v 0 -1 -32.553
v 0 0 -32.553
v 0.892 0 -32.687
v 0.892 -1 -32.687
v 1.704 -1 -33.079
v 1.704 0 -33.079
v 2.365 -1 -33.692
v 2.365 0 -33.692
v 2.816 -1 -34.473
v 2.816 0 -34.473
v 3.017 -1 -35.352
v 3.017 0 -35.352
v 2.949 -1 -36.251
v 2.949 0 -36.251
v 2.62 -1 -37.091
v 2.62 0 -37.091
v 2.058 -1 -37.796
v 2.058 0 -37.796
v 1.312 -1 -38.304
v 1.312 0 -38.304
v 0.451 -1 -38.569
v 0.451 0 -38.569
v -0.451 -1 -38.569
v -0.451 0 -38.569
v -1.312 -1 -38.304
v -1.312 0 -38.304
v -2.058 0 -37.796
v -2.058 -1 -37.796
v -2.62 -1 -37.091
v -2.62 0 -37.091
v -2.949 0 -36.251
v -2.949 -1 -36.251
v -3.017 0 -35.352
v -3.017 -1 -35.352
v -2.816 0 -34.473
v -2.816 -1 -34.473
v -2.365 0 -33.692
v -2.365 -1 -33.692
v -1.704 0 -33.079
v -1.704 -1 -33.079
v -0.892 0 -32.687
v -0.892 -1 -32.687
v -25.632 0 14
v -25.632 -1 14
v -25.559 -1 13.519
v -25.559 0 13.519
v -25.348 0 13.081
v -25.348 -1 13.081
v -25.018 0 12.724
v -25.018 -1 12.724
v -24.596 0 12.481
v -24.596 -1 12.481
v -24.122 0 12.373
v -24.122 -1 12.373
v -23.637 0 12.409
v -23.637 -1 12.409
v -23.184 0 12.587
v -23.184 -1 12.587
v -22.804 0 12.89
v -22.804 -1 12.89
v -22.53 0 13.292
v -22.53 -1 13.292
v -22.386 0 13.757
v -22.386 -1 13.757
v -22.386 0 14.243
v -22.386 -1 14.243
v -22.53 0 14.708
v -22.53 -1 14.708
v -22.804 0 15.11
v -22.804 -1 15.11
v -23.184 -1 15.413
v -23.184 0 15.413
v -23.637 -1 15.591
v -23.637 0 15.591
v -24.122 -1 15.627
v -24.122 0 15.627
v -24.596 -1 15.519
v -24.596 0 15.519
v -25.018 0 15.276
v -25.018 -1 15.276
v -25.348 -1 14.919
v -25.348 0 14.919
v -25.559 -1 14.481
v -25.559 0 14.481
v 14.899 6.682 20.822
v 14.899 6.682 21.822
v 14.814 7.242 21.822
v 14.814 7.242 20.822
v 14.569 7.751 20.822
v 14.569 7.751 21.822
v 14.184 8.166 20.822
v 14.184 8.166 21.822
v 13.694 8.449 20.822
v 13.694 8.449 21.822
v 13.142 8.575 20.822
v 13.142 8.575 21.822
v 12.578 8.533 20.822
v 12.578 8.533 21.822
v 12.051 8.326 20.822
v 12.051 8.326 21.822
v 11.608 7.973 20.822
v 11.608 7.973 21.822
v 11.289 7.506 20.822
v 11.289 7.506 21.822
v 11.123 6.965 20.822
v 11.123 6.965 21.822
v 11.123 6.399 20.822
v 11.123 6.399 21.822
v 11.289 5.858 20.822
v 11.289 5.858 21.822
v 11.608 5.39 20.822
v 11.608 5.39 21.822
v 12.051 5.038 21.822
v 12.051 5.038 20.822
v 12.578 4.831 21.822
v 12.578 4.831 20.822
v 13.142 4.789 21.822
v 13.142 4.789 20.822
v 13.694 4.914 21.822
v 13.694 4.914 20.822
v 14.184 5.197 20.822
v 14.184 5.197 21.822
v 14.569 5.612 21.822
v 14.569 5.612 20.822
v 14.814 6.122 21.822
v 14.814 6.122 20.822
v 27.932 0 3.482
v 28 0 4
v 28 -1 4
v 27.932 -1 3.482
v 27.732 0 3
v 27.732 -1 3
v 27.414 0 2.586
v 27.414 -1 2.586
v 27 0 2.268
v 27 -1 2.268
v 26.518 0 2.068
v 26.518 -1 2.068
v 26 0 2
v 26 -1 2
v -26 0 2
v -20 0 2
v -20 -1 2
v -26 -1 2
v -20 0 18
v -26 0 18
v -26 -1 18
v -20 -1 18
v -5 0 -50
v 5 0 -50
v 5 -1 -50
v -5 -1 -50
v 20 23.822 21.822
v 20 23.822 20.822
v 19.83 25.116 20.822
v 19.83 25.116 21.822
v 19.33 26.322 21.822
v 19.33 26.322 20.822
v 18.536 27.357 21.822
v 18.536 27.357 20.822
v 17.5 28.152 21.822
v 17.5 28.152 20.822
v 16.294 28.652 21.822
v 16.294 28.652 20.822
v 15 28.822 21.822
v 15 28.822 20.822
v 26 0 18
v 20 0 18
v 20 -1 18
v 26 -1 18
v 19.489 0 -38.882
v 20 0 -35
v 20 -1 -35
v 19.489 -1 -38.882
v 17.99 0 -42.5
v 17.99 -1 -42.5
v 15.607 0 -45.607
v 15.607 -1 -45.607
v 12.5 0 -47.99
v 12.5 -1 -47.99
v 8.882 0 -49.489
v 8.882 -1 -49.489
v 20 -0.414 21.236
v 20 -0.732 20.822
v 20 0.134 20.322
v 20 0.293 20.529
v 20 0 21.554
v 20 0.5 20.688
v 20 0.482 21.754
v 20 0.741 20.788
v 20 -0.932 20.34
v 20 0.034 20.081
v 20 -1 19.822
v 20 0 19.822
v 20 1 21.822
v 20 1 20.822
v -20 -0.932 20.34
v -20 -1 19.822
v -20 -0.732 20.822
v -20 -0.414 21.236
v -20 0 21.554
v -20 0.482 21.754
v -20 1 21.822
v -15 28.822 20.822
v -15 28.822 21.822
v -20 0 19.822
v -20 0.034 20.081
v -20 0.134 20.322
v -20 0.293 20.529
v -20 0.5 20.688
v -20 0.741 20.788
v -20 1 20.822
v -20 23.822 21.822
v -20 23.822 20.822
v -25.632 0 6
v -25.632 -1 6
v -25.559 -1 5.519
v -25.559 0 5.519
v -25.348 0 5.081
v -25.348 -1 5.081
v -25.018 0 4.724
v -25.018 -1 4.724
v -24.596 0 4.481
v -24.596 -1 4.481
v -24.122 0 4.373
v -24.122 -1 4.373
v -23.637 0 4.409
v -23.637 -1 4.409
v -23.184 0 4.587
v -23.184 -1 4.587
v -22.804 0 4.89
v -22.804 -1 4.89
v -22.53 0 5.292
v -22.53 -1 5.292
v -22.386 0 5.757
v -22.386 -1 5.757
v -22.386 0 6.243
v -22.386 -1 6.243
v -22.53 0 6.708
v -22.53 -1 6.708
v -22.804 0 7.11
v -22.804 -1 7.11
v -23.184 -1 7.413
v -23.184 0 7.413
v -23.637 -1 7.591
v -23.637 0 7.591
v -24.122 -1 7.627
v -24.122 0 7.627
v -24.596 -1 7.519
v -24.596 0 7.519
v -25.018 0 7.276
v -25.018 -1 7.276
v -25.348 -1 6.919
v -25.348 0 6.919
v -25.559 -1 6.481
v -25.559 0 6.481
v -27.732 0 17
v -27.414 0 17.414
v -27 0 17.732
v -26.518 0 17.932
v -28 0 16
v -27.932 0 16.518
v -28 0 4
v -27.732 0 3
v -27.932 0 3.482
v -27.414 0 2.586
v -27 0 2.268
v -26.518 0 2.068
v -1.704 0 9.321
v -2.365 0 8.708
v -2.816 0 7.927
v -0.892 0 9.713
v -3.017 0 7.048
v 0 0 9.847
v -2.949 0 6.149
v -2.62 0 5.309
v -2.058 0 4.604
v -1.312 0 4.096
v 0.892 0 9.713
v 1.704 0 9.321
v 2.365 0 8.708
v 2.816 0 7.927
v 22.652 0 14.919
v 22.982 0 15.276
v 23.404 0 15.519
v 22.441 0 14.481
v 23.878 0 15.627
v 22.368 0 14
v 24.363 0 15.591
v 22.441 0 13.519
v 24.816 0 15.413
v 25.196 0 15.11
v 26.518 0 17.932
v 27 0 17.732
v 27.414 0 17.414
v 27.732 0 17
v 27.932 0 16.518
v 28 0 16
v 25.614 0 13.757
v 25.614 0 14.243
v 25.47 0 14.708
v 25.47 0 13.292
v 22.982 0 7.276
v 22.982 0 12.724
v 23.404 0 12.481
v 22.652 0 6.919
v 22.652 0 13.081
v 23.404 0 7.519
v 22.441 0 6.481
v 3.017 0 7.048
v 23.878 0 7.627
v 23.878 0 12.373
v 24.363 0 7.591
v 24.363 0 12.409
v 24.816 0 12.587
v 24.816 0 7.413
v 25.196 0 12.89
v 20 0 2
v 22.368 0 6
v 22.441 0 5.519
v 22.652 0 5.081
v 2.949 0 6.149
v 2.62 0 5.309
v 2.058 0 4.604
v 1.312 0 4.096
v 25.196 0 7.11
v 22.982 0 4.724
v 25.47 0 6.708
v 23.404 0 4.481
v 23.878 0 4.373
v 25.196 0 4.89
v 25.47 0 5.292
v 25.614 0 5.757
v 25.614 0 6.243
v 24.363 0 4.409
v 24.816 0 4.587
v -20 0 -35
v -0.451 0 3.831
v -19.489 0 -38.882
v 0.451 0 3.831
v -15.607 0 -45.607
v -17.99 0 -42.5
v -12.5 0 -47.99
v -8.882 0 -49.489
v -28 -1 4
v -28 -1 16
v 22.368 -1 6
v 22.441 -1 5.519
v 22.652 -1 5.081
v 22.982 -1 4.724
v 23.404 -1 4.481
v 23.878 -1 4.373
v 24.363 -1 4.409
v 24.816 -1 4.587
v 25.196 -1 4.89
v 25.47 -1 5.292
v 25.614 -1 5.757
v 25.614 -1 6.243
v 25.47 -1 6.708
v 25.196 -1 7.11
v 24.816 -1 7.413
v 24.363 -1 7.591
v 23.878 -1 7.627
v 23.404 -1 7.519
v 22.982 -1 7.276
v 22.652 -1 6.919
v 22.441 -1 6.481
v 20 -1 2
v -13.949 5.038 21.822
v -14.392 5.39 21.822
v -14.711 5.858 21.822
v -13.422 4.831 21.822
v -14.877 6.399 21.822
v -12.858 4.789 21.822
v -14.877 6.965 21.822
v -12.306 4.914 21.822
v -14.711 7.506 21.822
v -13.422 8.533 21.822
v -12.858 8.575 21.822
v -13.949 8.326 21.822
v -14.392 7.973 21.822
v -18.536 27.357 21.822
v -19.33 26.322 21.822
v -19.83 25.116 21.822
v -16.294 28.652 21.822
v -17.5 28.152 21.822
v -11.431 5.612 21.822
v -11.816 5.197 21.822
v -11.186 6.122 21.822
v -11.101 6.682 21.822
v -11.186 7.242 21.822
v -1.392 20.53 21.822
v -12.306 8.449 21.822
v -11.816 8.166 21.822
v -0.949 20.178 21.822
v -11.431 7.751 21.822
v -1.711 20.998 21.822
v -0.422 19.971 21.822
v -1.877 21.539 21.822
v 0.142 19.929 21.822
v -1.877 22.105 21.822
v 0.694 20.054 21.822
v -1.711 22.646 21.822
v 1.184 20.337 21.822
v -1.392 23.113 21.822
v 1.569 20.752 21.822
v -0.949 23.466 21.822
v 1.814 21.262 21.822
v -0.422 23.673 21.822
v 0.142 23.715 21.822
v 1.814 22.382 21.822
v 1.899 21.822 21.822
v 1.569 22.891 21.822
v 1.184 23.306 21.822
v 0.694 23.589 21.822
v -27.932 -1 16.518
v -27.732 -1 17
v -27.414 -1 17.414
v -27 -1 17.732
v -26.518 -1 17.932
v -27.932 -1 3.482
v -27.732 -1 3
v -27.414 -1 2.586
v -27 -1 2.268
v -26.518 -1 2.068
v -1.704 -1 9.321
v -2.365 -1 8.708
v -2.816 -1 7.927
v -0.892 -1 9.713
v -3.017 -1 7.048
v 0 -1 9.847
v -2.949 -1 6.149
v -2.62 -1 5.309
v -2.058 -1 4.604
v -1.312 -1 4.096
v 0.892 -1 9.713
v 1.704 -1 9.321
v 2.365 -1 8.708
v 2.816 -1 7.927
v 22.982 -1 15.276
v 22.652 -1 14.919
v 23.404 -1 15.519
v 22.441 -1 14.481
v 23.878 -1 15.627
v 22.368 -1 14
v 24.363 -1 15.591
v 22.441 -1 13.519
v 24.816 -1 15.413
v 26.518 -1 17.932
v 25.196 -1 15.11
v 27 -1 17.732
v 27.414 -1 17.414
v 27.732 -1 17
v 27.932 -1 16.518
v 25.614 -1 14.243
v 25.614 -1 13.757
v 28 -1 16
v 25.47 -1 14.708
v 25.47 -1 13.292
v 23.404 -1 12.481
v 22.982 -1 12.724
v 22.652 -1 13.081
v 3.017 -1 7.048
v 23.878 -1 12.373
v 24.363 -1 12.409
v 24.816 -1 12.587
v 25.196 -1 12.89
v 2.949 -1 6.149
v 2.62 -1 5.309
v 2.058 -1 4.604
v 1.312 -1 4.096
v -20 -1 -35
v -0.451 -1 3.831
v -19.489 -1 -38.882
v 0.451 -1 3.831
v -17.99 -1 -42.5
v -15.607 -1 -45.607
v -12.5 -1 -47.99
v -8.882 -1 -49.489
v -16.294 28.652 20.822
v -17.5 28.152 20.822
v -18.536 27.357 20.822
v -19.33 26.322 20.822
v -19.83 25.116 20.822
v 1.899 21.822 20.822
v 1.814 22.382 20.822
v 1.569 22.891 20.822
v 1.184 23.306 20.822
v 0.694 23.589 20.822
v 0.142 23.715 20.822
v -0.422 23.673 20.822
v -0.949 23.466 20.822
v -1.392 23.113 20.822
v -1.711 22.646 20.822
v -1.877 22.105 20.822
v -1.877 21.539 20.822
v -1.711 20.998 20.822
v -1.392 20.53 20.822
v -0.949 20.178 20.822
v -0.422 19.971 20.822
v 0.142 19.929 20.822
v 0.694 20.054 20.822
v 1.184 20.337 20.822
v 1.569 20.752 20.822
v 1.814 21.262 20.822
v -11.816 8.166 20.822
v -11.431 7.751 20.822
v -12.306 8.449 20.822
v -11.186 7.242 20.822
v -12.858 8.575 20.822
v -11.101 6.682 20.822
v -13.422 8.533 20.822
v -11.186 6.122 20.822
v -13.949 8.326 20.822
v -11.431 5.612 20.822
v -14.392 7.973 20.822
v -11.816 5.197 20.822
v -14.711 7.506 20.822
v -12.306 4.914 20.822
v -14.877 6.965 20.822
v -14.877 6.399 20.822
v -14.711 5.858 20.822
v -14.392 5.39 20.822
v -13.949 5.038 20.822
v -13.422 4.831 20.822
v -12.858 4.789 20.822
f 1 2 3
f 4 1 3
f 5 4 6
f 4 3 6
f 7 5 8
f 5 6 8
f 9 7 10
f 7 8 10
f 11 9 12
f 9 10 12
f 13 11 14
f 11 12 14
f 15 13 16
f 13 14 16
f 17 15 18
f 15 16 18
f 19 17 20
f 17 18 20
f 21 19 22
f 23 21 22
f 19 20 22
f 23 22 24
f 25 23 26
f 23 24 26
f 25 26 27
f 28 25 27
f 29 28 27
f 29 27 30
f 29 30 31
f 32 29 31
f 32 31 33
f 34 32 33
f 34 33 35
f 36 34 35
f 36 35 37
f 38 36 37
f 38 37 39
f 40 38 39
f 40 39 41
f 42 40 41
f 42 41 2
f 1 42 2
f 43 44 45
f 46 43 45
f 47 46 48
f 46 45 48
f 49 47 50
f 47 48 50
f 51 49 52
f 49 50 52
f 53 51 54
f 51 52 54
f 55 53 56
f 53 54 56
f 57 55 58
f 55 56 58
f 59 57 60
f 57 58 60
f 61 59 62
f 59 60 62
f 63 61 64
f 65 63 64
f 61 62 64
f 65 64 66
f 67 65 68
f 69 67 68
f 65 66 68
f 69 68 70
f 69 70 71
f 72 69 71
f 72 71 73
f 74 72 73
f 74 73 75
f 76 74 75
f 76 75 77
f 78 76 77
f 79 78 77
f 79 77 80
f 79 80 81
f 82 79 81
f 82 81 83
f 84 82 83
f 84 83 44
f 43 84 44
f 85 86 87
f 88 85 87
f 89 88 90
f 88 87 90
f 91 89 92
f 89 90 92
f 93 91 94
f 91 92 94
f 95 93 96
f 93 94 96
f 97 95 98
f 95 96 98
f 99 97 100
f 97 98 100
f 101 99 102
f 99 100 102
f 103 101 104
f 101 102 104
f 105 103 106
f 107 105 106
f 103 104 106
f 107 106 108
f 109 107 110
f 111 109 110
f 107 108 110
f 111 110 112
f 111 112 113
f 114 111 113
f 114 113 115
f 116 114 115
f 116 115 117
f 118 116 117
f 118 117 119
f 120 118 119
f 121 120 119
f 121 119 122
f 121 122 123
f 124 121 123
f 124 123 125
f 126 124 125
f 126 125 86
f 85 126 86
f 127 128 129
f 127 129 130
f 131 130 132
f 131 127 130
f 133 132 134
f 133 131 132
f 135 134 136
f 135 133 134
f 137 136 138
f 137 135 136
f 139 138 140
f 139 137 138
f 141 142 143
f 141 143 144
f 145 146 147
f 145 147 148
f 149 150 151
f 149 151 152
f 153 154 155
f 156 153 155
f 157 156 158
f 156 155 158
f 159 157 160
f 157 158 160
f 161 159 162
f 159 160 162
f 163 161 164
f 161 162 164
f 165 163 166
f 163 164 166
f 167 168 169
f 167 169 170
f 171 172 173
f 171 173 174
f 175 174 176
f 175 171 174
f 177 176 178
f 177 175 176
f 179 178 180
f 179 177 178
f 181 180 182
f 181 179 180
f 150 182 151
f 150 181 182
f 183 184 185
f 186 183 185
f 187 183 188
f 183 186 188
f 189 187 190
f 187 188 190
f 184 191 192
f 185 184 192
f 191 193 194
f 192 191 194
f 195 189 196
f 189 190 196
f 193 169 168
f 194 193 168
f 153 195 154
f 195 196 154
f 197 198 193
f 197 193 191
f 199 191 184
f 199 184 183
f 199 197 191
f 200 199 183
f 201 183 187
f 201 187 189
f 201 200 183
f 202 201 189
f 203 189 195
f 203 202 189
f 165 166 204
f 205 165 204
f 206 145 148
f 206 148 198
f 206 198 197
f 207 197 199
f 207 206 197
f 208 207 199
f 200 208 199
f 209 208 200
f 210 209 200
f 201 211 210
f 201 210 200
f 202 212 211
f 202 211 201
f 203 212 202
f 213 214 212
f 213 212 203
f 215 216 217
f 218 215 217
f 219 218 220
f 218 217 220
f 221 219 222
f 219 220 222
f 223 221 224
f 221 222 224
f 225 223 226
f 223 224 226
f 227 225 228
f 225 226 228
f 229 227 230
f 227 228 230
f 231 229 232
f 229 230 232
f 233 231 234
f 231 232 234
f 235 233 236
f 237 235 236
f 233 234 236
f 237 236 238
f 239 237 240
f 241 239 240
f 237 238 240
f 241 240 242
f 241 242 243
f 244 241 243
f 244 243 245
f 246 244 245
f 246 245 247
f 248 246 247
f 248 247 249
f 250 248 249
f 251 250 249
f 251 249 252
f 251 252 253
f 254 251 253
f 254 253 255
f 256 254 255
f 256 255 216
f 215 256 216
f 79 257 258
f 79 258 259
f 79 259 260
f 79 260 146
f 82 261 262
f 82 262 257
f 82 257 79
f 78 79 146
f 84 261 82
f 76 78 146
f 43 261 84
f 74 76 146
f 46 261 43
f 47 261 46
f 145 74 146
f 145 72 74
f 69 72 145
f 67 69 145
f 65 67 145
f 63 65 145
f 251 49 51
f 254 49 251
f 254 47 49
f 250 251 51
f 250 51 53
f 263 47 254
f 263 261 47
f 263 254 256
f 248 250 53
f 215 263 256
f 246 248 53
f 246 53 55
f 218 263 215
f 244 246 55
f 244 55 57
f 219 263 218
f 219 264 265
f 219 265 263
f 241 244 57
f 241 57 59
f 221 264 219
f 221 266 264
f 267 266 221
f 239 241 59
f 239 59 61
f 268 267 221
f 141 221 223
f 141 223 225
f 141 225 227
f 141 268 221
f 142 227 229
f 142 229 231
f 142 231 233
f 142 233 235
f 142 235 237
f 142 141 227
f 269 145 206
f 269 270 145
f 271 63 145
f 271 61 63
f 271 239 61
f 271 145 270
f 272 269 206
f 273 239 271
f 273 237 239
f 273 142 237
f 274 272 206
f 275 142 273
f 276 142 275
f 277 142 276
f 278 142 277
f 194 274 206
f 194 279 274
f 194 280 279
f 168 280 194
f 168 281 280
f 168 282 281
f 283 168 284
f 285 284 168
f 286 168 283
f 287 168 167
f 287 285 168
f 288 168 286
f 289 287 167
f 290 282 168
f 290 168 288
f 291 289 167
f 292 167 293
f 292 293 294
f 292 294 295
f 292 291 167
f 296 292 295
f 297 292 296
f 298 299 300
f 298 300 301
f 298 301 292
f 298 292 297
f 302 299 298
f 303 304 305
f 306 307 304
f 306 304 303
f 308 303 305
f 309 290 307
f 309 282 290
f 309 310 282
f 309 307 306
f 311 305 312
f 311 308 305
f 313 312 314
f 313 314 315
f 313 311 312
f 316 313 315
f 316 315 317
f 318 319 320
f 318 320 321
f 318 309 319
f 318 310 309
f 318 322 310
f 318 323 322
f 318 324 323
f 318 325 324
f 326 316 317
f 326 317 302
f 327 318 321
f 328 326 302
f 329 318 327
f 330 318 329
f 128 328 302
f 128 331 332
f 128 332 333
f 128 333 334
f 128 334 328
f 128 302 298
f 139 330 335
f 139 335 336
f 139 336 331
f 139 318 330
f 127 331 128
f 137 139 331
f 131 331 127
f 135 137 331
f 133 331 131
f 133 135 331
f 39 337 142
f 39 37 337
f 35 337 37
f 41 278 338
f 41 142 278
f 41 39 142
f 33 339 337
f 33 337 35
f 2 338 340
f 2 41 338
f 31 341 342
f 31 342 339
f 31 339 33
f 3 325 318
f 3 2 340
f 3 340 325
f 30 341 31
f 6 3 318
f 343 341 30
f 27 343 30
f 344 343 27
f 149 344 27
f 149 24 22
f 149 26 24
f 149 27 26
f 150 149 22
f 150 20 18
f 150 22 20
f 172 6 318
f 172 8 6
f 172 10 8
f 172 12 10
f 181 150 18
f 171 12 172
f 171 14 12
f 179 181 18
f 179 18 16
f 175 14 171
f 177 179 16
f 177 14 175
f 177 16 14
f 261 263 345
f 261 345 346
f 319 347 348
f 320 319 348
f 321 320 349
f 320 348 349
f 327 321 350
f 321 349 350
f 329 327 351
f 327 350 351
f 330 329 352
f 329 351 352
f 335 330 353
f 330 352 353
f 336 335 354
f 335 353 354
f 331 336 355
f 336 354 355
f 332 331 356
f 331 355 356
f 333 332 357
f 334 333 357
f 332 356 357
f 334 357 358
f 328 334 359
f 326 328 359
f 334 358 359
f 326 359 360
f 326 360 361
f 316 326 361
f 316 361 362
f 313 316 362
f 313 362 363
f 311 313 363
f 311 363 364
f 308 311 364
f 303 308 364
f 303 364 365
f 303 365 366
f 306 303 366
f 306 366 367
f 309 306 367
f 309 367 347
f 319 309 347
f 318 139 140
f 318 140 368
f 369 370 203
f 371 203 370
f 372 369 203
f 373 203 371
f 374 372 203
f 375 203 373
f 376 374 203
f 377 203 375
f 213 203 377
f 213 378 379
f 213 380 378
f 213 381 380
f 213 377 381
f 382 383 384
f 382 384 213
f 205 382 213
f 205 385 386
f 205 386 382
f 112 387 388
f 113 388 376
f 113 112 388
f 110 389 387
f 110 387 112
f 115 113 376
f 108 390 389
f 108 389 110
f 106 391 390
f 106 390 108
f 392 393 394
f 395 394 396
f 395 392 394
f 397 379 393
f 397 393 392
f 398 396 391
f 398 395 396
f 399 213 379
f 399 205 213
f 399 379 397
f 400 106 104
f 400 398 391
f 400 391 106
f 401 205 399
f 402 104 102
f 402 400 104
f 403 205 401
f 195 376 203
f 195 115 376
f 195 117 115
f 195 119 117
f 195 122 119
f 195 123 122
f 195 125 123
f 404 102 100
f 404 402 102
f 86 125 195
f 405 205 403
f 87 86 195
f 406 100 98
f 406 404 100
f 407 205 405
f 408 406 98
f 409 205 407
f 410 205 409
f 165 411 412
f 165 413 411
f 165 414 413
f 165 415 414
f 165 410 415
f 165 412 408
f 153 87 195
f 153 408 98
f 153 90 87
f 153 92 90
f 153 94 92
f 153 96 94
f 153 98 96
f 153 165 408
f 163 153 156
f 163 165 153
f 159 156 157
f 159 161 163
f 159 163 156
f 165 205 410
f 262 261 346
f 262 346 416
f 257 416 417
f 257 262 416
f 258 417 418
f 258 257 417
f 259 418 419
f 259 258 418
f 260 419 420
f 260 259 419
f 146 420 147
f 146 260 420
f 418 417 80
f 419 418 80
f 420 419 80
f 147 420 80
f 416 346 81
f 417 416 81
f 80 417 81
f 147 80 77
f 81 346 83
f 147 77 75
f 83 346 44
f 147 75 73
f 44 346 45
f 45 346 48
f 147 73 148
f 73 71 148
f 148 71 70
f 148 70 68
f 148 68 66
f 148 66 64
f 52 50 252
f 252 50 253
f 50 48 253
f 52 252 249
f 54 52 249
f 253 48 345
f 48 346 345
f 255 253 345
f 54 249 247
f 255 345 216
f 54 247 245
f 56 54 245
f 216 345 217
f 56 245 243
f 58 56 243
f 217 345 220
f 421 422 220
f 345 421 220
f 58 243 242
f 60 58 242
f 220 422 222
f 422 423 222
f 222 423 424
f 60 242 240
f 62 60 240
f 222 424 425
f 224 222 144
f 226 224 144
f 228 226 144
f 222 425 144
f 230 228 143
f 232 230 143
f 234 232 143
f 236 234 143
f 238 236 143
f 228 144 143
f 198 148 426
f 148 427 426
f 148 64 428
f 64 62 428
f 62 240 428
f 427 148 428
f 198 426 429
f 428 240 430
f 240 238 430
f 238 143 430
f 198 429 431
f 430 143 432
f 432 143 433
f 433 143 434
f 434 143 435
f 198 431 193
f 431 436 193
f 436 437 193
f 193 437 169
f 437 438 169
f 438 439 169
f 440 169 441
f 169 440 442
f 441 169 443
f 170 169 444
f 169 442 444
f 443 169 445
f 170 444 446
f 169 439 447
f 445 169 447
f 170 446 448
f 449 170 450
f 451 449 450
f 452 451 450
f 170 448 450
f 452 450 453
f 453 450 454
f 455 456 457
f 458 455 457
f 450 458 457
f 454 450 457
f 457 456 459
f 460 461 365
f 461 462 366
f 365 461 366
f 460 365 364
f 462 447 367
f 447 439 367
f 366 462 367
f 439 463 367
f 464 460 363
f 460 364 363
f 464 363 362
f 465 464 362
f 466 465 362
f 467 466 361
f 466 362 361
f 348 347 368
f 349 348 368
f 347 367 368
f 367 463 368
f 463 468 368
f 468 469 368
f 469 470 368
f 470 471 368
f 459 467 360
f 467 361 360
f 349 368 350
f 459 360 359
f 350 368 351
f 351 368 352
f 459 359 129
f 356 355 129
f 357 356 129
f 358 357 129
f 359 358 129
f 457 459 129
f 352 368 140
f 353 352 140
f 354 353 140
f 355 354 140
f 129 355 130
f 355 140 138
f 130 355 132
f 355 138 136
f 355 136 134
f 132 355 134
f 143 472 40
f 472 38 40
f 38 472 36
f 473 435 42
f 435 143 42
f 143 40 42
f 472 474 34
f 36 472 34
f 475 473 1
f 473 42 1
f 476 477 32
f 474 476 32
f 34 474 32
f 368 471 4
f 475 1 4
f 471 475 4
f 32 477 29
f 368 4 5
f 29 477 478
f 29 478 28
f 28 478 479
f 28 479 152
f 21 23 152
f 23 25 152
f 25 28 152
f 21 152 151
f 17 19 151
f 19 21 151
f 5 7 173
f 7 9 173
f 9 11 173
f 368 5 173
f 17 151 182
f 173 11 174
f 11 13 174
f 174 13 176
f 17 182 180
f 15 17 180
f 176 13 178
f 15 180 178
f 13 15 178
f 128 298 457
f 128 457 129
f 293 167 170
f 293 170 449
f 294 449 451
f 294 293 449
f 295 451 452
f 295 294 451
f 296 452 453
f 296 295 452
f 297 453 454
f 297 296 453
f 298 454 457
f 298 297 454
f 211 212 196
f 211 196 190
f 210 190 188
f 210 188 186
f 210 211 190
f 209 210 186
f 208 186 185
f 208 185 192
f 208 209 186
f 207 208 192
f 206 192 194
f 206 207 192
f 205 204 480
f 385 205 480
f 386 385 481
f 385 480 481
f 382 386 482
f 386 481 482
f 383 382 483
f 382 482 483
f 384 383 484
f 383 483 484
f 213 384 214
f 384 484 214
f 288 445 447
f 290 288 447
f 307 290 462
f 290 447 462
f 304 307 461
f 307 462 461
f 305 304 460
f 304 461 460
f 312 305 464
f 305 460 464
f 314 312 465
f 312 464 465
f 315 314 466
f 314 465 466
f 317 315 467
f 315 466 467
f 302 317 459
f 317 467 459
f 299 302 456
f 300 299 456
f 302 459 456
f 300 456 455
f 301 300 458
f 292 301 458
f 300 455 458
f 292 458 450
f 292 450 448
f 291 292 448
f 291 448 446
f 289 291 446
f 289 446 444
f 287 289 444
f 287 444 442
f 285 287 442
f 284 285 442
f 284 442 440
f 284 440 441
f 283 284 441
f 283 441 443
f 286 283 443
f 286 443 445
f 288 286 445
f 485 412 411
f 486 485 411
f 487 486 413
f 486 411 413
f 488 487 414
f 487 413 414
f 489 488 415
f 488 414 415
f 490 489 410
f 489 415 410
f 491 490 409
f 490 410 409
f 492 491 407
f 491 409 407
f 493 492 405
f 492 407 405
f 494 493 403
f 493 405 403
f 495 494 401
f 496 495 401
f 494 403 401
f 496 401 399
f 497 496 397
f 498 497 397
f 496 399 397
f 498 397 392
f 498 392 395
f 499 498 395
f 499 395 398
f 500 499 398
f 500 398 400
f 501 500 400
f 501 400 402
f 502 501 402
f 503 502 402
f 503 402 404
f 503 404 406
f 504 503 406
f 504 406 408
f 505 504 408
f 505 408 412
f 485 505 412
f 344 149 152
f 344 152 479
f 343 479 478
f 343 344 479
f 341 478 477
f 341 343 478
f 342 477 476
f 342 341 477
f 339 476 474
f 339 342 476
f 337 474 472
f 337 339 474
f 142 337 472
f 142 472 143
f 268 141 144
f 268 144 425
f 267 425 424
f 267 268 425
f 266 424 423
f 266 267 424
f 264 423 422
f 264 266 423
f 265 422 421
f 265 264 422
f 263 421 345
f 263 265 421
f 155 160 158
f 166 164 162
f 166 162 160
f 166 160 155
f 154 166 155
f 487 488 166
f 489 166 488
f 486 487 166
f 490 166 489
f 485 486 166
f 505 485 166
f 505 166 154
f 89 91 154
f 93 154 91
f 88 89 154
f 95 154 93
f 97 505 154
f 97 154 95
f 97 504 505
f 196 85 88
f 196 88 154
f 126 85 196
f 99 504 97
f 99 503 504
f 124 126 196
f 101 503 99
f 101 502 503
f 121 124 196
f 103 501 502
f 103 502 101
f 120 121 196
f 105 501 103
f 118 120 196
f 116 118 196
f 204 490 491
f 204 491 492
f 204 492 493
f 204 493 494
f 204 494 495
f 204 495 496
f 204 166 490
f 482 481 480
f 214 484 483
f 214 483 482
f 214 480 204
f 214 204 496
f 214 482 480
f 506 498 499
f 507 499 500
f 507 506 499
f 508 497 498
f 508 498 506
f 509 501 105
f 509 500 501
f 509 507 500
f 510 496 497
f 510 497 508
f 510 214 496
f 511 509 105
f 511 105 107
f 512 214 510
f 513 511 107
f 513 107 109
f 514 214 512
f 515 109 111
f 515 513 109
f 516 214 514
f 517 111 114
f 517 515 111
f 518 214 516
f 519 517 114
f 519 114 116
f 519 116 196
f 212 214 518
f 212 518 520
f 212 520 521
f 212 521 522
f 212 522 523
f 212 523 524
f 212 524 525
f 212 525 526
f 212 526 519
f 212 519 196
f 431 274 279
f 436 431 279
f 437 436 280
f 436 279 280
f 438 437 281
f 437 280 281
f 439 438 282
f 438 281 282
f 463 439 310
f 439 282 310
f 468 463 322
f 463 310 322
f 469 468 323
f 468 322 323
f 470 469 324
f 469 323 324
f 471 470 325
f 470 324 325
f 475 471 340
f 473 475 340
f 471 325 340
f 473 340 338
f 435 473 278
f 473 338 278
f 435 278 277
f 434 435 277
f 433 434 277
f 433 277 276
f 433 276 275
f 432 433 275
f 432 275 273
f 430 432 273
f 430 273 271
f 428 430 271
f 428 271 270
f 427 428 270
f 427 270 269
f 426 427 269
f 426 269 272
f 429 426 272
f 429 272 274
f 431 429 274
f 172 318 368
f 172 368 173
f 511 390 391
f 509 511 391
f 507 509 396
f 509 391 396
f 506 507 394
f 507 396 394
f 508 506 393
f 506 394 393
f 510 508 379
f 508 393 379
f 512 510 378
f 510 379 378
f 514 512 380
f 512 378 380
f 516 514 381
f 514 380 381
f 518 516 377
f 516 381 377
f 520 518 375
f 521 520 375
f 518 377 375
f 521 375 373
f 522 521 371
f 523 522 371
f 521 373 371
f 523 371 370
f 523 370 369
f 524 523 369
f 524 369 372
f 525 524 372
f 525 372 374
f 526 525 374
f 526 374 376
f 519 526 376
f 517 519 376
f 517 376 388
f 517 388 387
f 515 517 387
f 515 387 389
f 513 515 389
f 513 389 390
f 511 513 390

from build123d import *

# Parameters (mm, degrees)
BASE_FLANGE1_DEPTH       = 1
SKETCHED_START           = 21.616422755
SKETCHED_BEND1_OUTLINE_W = 40
SKETCHED_BEND1_OUTLINE_H = 1
SKETCHED_BEND1_DEPTH     = 28.383577245
SKETCHED_START_2         = 20.821902755
SKETCHED_BEND1_2_DEPTH   = 0.00548
SKETCHED_START_3         = 19.821902755
SKETCHED_BEND1_3_DEPTH   = 2
SKETCHED_START_4         = -20
SKETCHED_BEND1_4_DEPTH   = 40
SKETCH7_R                = 3.025
CUT_EXTRUDE1_DEPTH       = 10
F_6_CLEARANCE_HOLE1_D    = 3.7973
F_4_CLEARANCE_HOLE2_D    = 3.2639


with BuildPart() as part:
    # Base-Flange1: sheet metal written as solids
    # Sketch1 → Base-Flange1 (new body)
    with BuildSketch(Plane(origin=(0, 0, 0), x_dir=(1, 0, 0), z_dir=(0, 1, 0))):
        with BuildLine():
            Line((-20, -18), (-20, -45))
            ThreePointArc((-20, -45), (-18.535533906, -48.535533906), (-15, -50))
            Line((-15, -50), (15, -50))
            ThreePointArc((15, -50), (18.535533906, -48.535533906), (20, -45))
            Line((20, -45), (20, -18))
            Line((20, -18), (26, -18))
            ThreePointArc((26, -18), (27.414213562, -17.414213562), (28, -16))
            Line((28, -16), (28, -4))
            ThreePointArc((28, -4), (27.414213562, -2.585786438), (26, -2))
            Line((26, -2), (20, -2))
            Line((20, -2), (20, 35))
            ThreePointArc((20, 35), (15.606601718, 45.606601718), (5, 50))
            Line((5, 50), (-5, 50))
            ThreePointArc((-5, 50), (-15.606601718, 45.606601718), (-20, 35))
            Line((-20, 35), (-20, -2))
            Line((-20, -2), (-26, -2))
            ThreePointArc((-26, -2), (-27.414213562, -2.585786438), (-28, -4))
            Line((-28, -4), (-28, -16))
            ThreePointArc((-28, -16), (-27.414213562, -17.414213562), (-26, -18))
            Line((-26, -18), (-20, -18))
        make_face()
    extrude(amount=-BASE_FLANGE1_DEPTH)

    # Sketched Bend1: read off the stored shape, not the designer's step
    # Sketched Bend1 outline → Sketched Bend1 (cut)
    with BuildSketch(Plane.XY.offset(SKETCHED_START)):
        with Locations((0, -0.5)):
            Rectangle(SKETCHED_BEND1_OUTLINE_W, SKETCHED_BEND1_OUTLINE_H)
    extrude(amount=SKETCHED_BEND1_DEPTH, mode=Mode.SUBTRACT)

    # Sketched Bend1 2 outline → Sketched Bend1 2 (add)
    with BuildSketch(Plane.XY.offset(SKETCHED_START_2)):
        with BuildLine():
            Line((20, 0), (20, 23.821902755))
            ThreePointArc((20, 23.821902755), (18.535533906, 27.357436661), (15, 28.821902755))
            Line((15, 28.821902755), (-15, 28.821902755))
            ThreePointArc((-15, 28.821902755), (-18.535533906, 27.357436661), (-20, 23.821902755))
            Line((-20, 23.821902755), (-20, 0))
            Line((-20, 0), (20, 0))
        make_face()
    extrude(amount=SKETCHED_BEND1_2_DEPTH)

    # Sketched Bend1 3 outline → Sketched Bend1 3 (add)
    with BuildSketch(Plane.XY.offset(SKETCHED_START_3)):
        with BuildLine():
            Line((20, 0), (20, 23.821902755))
            ThreePointArc((20, 23.821902755), (18.535533906, 27.357436661), (15, 28.821902755))
            Line((15, 28.821902755), (-15, 28.821902755))
            ThreePointArc((-15, 28.821902755), (-18.535533906, 27.357436661), (-20, 23.821902755))
            Line((-20, 23.821902755), (-20, 0))
            Line((-20, 0), (20, 0))
        make_face()
    extrude(amount=SKETCHED_BEND1_3_DEPTH)

    # Sketched Bend1 4 outline → Sketched Bend1 4 (cut)
    with BuildSketch(Plane.YZ.offset(SKETCHED_START_4)):
        with BuildLine():
            Line((28.821902755, 19.821902755), (28.821902755, 20.821902755))
            Line((28.821902755, 20.821902755), (1, 20.821902755))
            ThreePointArc((1, 20.821902755), (0.292893219, 20.529009536), (0, 19.821902755))
            Line((0, 19.821902755), (28.821902755, 19.821902755))
        make_face()
        with BuildLine():
            ThreePointArc((-1, 19.821902755), (-0.414213562, 21.236116317), (1, 21.821902755))
            Line((1, 21.821902755), (0, 21.821902755))
            Line((0, 21.821902755), (0, 21.616422755))
            Line((0, 21.616422755), (-1, 21.616422755))
            Line((-1, 21.616422755), (-1, 19.821902755))
        make_face()
    extrude(amount=SKETCHED_BEND1_4_DEPTH, mode=Mode.SUBTRACT)

    # Sketch7 → Cut-Extrude1 (cut)
    with BuildSketch(Plane(origin=(0, 0, 0), x_dir=(1, 0, 0), z_dir=(0, 1, 0))):
        with Locations(Location((0, -6.821902755, 0), (0, 0, 270))):
            Circle(SKETCH7_R)
        with Locations(Location((0, 35.578097245, 0), (0, 0, 270))):
            Circle(SKETCH7_R)
    extrude(amount=-CUT_EXTRUDE1_DEPTH, mode=Mode.SUBTRACT)

    # #6 Clearance Hole1 (through all)
    with Locations(Plane(origin=(0, 0, 20.821902755), x_dir=(-1, 0, 0), z_dir=(0, 0, -1))):
        with Locations((13, 6.681902755), (-13, 6.681902755), (0, 21.821902755)):
            Hole(F_6_CLEARANCE_HOLE1_D / 2)

    # #4 Clearance Hole2 (through all)
    with Locations(Plane(origin=(0, 0, 0), x_dir=(1, 0, 0), z_dir=(0, 1, 0))):
        with Locations((-24, -6), (-24, -14), (24, -6), (24, -14)):
            Hole(F_4_CLEARANCE_HOLE2_D / 2)


solid = part.part
